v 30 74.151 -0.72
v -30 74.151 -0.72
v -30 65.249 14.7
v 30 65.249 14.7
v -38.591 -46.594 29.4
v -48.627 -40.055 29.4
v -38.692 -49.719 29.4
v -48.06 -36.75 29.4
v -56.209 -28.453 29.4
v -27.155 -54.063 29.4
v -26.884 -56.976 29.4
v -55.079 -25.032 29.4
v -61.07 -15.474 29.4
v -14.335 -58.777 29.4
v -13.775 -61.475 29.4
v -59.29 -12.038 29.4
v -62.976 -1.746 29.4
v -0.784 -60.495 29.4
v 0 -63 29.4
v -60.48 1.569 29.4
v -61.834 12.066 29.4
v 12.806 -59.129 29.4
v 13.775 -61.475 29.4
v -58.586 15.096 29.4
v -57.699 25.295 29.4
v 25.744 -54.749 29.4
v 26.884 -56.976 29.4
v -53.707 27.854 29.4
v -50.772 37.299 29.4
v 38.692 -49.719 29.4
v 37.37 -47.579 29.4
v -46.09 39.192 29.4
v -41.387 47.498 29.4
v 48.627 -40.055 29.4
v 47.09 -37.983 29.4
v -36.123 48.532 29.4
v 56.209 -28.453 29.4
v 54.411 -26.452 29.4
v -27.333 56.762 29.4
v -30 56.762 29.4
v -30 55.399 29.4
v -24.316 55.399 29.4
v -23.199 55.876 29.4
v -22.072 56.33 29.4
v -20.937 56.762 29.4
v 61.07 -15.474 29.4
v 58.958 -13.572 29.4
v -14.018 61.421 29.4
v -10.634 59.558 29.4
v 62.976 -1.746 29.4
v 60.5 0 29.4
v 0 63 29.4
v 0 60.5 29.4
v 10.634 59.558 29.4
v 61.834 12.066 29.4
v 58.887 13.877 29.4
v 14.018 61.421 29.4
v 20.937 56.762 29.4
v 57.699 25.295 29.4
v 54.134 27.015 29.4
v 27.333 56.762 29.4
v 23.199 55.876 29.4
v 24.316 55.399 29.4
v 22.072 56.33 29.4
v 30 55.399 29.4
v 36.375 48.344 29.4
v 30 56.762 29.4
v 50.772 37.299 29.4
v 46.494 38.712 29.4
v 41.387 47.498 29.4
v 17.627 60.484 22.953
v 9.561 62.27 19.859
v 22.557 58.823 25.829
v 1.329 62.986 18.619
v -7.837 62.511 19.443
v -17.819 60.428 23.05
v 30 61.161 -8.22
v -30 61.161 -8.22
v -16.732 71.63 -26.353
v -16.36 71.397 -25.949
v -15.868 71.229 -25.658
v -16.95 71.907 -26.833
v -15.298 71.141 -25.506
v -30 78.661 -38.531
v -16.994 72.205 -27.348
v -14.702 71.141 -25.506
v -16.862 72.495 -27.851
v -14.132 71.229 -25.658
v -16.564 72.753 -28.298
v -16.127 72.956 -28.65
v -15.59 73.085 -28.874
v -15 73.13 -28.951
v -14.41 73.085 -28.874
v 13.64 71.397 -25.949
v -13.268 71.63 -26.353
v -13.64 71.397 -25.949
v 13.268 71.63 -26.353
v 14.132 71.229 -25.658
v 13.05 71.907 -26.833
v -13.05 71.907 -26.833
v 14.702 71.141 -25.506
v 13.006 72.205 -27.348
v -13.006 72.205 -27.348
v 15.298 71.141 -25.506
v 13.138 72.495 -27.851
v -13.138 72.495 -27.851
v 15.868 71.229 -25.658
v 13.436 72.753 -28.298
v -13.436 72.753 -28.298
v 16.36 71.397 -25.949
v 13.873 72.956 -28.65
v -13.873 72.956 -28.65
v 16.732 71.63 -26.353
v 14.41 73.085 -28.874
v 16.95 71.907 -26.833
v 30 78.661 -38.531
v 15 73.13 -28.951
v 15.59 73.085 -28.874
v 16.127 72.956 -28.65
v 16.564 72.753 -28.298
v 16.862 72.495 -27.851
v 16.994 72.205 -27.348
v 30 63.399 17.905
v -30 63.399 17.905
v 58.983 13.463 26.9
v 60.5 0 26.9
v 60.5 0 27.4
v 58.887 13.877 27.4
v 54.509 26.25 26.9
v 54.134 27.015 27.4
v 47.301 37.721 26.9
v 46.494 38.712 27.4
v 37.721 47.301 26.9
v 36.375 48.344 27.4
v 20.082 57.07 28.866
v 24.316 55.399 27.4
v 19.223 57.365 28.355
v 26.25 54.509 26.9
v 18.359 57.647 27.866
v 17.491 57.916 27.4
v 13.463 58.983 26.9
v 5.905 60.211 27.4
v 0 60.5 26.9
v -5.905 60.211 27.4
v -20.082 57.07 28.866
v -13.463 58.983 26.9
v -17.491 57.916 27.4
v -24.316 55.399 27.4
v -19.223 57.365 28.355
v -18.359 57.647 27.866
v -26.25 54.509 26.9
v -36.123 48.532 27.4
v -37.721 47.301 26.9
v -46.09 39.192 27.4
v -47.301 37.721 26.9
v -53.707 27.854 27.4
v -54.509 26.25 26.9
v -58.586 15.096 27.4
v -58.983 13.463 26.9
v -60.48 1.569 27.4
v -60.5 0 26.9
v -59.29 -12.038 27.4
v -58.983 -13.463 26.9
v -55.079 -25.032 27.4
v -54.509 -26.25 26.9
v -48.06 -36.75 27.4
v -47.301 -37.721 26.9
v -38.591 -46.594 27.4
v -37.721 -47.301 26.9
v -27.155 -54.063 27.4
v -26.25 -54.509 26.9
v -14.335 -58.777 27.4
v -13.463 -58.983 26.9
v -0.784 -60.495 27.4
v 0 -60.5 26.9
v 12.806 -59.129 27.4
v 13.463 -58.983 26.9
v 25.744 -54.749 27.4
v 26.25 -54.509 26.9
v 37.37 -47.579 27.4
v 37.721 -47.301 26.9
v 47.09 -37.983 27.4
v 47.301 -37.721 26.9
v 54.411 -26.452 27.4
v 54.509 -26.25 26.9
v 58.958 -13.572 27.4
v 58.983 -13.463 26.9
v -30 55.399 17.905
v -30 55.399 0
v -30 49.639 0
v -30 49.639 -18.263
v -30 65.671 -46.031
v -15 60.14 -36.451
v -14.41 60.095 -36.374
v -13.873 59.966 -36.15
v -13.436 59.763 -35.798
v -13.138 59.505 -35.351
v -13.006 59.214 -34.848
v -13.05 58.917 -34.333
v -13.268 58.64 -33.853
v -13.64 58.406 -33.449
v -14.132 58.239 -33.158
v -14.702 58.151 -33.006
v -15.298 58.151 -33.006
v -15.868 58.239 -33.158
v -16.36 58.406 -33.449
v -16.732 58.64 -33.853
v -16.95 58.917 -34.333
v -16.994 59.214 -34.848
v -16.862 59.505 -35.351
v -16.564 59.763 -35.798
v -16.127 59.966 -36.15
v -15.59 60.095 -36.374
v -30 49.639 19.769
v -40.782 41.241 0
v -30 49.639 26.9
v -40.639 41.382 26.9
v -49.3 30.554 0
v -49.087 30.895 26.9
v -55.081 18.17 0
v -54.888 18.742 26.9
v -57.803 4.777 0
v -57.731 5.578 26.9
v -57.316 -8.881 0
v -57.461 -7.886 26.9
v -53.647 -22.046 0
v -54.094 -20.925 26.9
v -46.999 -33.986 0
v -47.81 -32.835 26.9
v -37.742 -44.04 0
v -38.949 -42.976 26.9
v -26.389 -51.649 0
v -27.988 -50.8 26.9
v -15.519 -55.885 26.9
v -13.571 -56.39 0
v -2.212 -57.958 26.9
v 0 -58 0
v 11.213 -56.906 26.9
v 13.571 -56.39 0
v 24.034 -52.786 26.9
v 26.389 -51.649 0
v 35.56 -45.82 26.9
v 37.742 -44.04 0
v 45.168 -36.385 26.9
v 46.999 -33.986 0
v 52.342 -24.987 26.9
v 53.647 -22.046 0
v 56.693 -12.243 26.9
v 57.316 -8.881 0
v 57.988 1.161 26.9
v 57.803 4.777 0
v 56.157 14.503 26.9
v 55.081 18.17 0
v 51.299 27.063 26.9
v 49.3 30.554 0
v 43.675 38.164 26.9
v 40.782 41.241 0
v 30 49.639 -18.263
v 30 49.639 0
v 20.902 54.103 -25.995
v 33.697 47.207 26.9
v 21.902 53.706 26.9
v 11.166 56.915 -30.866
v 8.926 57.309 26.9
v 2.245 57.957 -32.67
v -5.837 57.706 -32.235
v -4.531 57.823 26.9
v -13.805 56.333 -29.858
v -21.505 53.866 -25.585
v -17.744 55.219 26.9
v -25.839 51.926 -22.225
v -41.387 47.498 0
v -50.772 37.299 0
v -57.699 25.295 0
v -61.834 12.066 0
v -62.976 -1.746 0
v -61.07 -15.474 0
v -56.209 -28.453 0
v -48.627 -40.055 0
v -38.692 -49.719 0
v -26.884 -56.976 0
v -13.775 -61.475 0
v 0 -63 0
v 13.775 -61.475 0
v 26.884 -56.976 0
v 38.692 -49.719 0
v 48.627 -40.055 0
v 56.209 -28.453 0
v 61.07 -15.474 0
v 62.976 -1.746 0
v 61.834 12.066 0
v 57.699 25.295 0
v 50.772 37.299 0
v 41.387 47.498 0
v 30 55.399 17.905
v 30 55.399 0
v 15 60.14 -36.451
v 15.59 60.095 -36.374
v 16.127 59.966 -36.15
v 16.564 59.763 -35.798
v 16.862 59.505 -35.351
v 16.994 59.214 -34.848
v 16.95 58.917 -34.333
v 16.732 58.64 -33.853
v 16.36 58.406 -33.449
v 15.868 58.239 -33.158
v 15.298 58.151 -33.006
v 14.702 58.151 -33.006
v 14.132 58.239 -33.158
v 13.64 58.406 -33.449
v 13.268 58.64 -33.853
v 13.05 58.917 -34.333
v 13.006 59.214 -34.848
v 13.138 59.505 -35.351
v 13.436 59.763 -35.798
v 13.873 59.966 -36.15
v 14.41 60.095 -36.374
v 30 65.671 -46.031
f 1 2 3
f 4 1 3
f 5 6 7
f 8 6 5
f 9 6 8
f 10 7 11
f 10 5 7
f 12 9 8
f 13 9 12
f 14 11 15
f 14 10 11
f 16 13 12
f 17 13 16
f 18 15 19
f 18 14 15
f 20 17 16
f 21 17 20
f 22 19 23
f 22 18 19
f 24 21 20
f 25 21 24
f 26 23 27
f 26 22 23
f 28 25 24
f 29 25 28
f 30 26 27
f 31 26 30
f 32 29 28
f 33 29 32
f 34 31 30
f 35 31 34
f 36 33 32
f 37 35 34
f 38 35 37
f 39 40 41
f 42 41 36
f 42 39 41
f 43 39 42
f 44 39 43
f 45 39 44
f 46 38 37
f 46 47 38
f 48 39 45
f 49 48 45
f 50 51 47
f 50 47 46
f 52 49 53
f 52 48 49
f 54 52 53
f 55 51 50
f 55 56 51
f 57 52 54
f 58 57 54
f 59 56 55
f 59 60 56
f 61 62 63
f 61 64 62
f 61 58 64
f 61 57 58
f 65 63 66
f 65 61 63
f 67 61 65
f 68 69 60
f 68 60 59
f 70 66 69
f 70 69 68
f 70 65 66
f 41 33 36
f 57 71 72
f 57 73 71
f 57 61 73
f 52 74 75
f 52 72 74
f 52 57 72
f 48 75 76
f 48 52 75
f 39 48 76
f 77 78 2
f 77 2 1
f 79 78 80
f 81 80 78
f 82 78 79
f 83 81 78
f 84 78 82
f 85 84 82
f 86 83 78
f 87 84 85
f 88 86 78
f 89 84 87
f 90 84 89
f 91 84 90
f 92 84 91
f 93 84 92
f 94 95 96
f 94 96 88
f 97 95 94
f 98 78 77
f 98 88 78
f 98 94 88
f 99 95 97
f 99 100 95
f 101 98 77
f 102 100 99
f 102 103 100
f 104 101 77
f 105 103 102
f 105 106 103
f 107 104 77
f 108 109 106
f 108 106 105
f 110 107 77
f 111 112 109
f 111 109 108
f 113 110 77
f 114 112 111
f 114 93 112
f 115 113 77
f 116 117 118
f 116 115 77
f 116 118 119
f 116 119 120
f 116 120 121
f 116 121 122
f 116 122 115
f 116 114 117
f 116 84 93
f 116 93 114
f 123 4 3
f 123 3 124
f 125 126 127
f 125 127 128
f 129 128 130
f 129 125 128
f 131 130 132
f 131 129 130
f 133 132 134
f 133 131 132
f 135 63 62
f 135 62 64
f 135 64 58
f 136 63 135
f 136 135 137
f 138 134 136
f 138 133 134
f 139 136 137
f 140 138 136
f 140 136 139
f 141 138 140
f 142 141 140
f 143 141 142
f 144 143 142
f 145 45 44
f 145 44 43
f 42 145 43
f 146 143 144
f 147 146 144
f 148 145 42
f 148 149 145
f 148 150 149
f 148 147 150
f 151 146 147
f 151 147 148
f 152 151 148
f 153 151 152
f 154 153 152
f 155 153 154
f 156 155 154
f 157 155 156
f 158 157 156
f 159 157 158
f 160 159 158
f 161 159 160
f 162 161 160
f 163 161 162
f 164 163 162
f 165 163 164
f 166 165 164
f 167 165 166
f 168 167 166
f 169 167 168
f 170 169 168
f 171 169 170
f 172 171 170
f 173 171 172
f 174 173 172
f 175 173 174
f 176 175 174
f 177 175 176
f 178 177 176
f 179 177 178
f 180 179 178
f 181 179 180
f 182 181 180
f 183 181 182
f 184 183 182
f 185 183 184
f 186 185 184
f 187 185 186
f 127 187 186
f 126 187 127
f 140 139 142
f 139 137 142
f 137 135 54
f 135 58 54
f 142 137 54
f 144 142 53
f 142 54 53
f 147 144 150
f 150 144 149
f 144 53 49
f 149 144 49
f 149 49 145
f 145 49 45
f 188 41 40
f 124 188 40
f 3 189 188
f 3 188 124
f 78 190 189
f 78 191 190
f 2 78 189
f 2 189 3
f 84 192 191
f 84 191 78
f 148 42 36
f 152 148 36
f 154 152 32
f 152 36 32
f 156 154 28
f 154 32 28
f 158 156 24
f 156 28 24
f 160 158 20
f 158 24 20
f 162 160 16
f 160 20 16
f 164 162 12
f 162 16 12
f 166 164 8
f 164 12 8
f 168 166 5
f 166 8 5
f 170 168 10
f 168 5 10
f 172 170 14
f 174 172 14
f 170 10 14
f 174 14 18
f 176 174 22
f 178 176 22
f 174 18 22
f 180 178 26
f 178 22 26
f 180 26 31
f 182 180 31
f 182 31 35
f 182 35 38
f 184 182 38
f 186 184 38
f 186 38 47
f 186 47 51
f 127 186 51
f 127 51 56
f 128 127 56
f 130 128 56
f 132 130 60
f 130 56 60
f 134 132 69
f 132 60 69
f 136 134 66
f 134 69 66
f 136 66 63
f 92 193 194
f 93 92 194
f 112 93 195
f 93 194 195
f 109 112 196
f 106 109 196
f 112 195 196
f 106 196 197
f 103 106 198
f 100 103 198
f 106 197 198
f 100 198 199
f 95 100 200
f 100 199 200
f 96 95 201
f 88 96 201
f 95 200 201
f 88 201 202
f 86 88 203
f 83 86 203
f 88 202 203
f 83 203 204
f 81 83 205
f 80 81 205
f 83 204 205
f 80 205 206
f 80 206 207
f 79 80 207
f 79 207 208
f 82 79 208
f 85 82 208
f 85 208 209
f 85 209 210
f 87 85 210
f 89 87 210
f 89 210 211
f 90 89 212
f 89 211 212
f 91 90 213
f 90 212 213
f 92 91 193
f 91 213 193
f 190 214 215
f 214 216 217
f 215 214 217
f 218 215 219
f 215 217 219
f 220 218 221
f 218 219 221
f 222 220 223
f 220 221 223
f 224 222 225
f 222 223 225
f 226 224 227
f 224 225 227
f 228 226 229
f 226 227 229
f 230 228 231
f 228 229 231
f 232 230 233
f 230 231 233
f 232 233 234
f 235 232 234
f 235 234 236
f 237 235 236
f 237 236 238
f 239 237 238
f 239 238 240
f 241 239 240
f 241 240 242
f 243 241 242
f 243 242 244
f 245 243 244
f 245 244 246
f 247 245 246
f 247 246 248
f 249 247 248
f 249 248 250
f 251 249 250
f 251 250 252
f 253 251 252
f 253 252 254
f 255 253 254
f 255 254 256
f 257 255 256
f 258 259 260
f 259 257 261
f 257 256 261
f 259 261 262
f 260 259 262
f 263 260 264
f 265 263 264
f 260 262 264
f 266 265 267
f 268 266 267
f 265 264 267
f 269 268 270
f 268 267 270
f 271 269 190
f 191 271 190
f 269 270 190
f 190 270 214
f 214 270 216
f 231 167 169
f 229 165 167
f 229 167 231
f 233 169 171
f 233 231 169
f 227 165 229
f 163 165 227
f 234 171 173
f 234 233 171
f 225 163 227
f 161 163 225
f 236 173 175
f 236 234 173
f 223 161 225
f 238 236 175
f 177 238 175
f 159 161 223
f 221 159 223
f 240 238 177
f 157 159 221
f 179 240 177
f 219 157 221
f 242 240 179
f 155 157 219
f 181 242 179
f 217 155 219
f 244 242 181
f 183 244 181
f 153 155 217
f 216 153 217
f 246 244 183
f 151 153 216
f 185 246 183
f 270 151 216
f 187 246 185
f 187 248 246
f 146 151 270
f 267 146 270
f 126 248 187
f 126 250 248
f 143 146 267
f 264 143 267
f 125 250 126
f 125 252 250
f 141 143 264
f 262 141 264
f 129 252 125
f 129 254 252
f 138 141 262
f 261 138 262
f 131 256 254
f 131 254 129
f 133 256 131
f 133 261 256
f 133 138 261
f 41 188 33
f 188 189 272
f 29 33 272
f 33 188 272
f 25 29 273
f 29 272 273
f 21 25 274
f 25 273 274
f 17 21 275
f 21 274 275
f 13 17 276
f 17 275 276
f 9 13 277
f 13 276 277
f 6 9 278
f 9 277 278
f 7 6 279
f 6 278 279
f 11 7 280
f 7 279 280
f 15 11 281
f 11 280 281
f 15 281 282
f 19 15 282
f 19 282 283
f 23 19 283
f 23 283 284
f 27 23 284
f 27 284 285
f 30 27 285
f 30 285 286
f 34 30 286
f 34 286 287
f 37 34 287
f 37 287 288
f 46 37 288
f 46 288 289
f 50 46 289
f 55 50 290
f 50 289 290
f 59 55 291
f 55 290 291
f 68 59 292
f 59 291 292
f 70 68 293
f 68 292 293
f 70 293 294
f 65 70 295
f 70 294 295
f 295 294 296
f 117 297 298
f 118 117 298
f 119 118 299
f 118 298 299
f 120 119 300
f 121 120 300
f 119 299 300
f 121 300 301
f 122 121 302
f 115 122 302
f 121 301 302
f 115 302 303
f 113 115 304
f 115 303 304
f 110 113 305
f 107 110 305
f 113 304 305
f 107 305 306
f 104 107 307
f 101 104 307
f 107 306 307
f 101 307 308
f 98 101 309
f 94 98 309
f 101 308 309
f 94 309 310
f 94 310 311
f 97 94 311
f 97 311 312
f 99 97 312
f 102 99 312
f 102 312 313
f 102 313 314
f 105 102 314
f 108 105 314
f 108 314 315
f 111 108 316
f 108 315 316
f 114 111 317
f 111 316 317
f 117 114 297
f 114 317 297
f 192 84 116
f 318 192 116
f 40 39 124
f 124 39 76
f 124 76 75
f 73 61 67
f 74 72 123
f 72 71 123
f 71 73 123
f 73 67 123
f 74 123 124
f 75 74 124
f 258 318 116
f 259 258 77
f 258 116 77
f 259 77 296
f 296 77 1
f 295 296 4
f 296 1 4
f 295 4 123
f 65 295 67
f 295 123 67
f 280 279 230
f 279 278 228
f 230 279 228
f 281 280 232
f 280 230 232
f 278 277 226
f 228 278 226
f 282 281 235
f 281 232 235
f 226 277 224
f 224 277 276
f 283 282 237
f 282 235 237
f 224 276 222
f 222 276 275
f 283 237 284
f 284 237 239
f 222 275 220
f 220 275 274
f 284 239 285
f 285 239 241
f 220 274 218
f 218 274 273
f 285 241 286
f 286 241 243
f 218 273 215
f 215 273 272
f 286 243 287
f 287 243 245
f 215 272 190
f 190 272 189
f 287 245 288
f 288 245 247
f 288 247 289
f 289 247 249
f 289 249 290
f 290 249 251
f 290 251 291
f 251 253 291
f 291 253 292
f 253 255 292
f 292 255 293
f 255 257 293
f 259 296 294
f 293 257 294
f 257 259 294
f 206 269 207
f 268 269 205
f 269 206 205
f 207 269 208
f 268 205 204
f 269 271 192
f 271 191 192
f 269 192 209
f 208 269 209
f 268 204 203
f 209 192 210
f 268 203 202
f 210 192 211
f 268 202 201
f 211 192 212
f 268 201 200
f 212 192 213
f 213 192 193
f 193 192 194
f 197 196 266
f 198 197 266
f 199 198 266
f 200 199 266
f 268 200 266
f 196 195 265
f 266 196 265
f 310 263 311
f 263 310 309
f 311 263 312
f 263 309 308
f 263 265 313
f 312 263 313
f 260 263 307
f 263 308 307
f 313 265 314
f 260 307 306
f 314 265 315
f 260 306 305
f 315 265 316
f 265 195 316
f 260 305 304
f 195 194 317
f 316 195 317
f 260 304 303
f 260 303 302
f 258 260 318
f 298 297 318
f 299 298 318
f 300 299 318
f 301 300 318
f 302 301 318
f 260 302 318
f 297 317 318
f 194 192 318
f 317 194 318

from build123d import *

# Parameters (mm, degrees)
SKETCH1_R                  = 63
SKETCH1_R_2                = 58
BOSS_EXTRUDE1_DEPTH        = 29.4
SKETCH2_R                  = 60.5
SKETCH2_R_2                = 58
CUT_EXTRUDE1_DEPTH         = 2
BOSS_EXTRUDE2_REACH        = 115.821
BOSS_EXTRUDE2_START_RADIUS = 63
BOSS_EXTRUDE2_END_RADIUS   = 63
SKETCH3_W                  = 60
SKETCH3_H                  = 29.4
SKETCH5_W                  = 29.4
SKETCH5_H                  = 24.463774017
CUT_EXTRUDE2_DEPTH         = 60
BOSS_EXTRUDE3_DEPTH        = 60
SKETCH7_W                  = 60
SKETCH7_H                  = 58.8
BOSS_EXTRUDE4_DEPTH        = 50
CUT_EXTRUDE3_REACH         = 184.817
SKETCH9_W                  = 60
SKETCH9_H                  = 50
BOSS_EXTRUDE5_DEPTH        = 31.44
SKETCH10_W                 = 60
SKETCH10_H                 = 31.44
BOSS_EXTRUDE6_DEPTH        = 30
SKETCH11_R                 = 58
CUT_EXTRUDE4_DEPTH         = 167.216683318
SKETCH14_W                 = 60
SKETCH14_H                 = 50.574659949
CUT_EXTRUDE5_DEPTH         = 14.7
CUT_EXTRUDE6_REACH         = 169.252
BOSS_EXTRUDE7_REACH        = 150.201
BOSS_EXTRUDE10_DEPTH       = 60
SKETCH17_R                 = 58
CUT_EXTRUDE7_DEPTH         = 148.031754667
CUT_EXTRUDE7_DEPTH_BACK    = 148.031754667
CUT_EXTRUDE13_START        = -2.5
SKETCH26_R                 = 60.5
SKETCH26_R_2               = 57.5
CUT_EXTRUDE13_DEPTH        = 10
SKETCH27_R                 = 63
SKETCH27_R_2               = 60.5
CUT_EXTRUDE14_DEPTH        = 10
SKETCH28_R                 = 82.177963531
CUT_EXTRUDE15_DEPTH        = 10
SKETCH18_W                 = 60
SKETCH18_H                 = 15
CUT_EXTRUDE8_DEPTH         = 50
SKETCH29_R                 = 2
CUT_EXTRUDE16_DEPTH        = 15
CUT_EXTRUDE17_REACH        = 150.403
SKETCH30_W                 = 60
SKETCH30_H                 = 15


with BuildPart() as part:
    # Sketch1 → Boss-Extrude1 (new body)
    with BuildSketch(Plane.XY):
        Circle(SKETCH1_R)
        Circle(SKETCH1_R_2, mode=Mode.SUBTRACT)
    extrude(amount=BOSS_EXTRUDE1_DEPTH)

    # Sketch2 → Cut-Extrude1 (cut)
    with BuildSketch(Plane.XY.offset(29.4)):
        Circle(SKETCH2_R)
        Circle(SKETCH2_R_2, mode=Mode.SUBTRACT)
    extrude(amount=-CUT_EXTRUDE1_DEPTH, mode=Mode.SUBTRACT)

    # Boss-Extrude2: from a cylinder face, 115.821 long prism both ways, kept between that surface and its translate by the depth
    boss_extrude2_start = Plane(origin=(0, 0, 14.7), z_dir=(0, 0, -1)) * Cylinder(BOSS_EXTRUDE2_START_RADIUS, 358.642, mode=Mode.PRIVATE)
    boss_extrude2_end = Plane(origin=(0, 20, 14.7), z_dir=(0, 0, -1)) * Cylinder(BOSS_EXTRUDE2_END_RADIUS, 358.642, mode=Mode.PRIVATE)
    # Sketch3 → Boss-Extrude2 (add, from a surface)
    with BuildSketch(Plane(origin=(0, 0, 0), x_dir=(1, 0, 0), z_dir=(0, 1, 0)), mode=Mode.PRIVATE) as boss_extrude2_sk1:
        with Locations((0, -14.7)):
            Rectangle(SKETCH3_W, SKETCH3_H)
    boss_extrude2_tool1 = extrude(boss_extrude2_sk1.sketch, amount=BOSS_EXTRUDE2_REACH, both=True, mode=Mode.PRIVATE)
    add(((boss_extrude2_tool1 - boss_extrude2_start) & boss_extrude2_end).solids().sort_by_distance((0, 65.398556, 14.7))[0])

    # Sketch5 → Cut-Extrude2 (cut)
    with BuildSketch(Plane.ZY.offset(30)):
        with Locations((14.7, 87.630442947)):
            Rectangle(SKETCH5_W, SKETCH5_H)
    extrude(amount=-CUT_EXTRUDE2_DEPTH, mode=Mode.SUBTRACT)

    # Sketch6 → Boss-Extrude3 (add)
    with BuildSketch(Plane.ZY.offset(30)):
        Polygon((0, 75.398555938), (29.4, 126.32084968), (29.4, 75.398555938), align=None)
    extrude(amount=-BOSS_EXTRUDE3_DEPTH)

    # Sketch7 → Boss-Extrude4 (add)
    with BuildSketch(Plane(origin=(0, 18.849638984, -32.648532425), x_dir=(1, 0, 0), z_dir=(0, 0.500000000000004, -0.8660254037844364))):
        with Locations((0, -94.697064851)):
            Rectangle(SKETCH7_W, SKETCH7_H)
    extrude(amount=BOSS_EXTRUDE4_DEPTH)

    # Sketch8 → Cut-Extrude3 (cut, up to next)
    with BuildSketch(Plane(origin=(30, 0, 0), x_dir=(0, 0, -1), z_dir=(1, 0, 0)), mode=Mode.PRIVATE) as cut_extrude3_sk1:
        Polygon((28.601270189, 125.859702809), (-29.4, 92.372653852), (-29.4, 126.32084968), (13.901270189, 151.32084968), align=None)
    cut_extrude3_tool1 = extrude(cut_extrude3_sk1.sketch, amount=-CUT_EXTRUDE3_REACH, mode=Mode.PRIVATE) & part.part
    add(cut_extrude3_tool1.solids().sort_by_distance((30, 123.250107, 3.896605))[0], mode=Mode.SUBTRACT)

    # Sketch9 → Boss-Extrude5 (add)
    with BuildSketch(Plane(origin=(0, 56.548916953, 32.648532425), x_dir=(1, 0, 0), z_dir=(0, -0.8660254037844365, -0.500000000000004))):
        with Locations((0, -62.699277969)):
            Rectangle(SKETCH9_W, SKETCH9_H)
    extrude(amount=BOSS_EXTRUDE5_DEPTH)

    # Sketch10 → Boss-Extrude6 (add)
    with BuildSketch(Plane(origin=(0, 18.849638984, -32.648532425), x_dir=(1, 0, 0), z_dir=(0, -0.500000000000004, 0.8660254037844364))):
        with Locations((0, 49.577064851)):
            Rectangle(SKETCH10_W, SKETCH10_H)
    extrude(amount=BOSS_EXTRUDE6_DEPTH)

    # Sketch11 → Cut-Extrude4 (cut, through all)
    with BuildSketch(Plane.XY.offset(29.4)):
        with Locations(Location((0, 0, 0), (0, 0, 121.147389922))):
            Circle(SKETCH11_R)
    extrude(amount=-CUT_EXTRUDE4_DEPTH, mode=Mode.SUBTRACT)

    # Sketch14 → Cut-Extrude5 (cut)
    with BuildSketch(Plane.XY.offset(29.4)):
        with Locations((0, 117.659983826)):
            Rectangle(SKETCH14_W, SKETCH14_H)
        with BuildLine():
            ThreePointArc((30, 55.398555938), (0, 63), (-30, 55.398555938))
            Line((-30, 55.398555938), (-30, 92.372653852))
            Line((-30, 92.372653852), (30, 92.372653852))
            Line((30, 92.372653852), (30, 55.398555938))
        make_face()
    extrude(amount=-CUT_EXTRUDE5_DEPTH, mode=Mode.SUBTRACT)

    # Sketch15 → Cut-Extrude6 (cut, up to next)
    with BuildSketch(Plane(origin=(30, 0, 0), x_dir=(0, 0, -1), z_dir=(1, 0, 0)), mode=Mode.PRIVATE) as cut_extrude6_sk1:
        Polygon((44.021270189, 99.151479356), (-14.7, 65.248738206), (-14.7, 100.859702809), (28.601270189, 125.859702809), align=None)
    cut_extrude6_tool1 = extrude(cut_extrude6_sk1.sketch, amount=-CUT_EXTRUDE6_REACH, mode=Mode.PRIVATE) & part.part
    add(cut_extrude6_tool1.solids().sort_by_distance((30, 96.99498, -10.999854))[0], mode=Mode.SUBTRACT)

    # Boss-Extrude7: up to this face of the body (flat: up to its plane)
    boss_extrude7_end = Plane(part.part.faces().sort_by_distance((-30, 70.930733499, -23.393070455))[0])
    # Sketch16 → Boss-Extrude7 (add, up to the picked face)
    with BuildSketch(Plane(origin=(30, 0, 0), x_dir=(0, 0, -1), z_dir=(1, 0, 0)), mode=Mode.PRIVATE) as boss_extrude7_sk1:
        Polygon((-17.904609691, 55.398555938), (-14.7, 55.398555938), (-14.7, 65.248738206), (-17.904609691, 63.398555938), align=None)
    boss_extrude7_tool1 = split(extrude(boss_extrude7_sk1.sketch, amount=-BOSS_EXTRUDE7_REACH, mode=Mode.PRIVATE), bisect_by=boss_extrude7_end, keep=Keep.BOTH, mode=Mode.PRIVATE)
    add(boss_extrude7_tool1.solids().sort_by(Axis((30, 59.877083, 16.246945), (-1, 0, 0)))[0])

    # Sketch25 → Boss-Extrude10 (add)
    with BuildSketch(Plane(origin=(30, 0, 0), x_dir=(0, 0, -1), z_dir=(1, 0, 0))):
        Polygon((-17.904609691, 55.398555938), (-31.761016151, 55.398555938), (-17.904609691, 63.398555938), align=None)
    extrude(amount=-BOSS_EXTRUDE10_DEPTH)

    # Sketch17 → Cut-Extrude7 (cut, two sides)
    with BuildSketch(Plane.XY.offset(29.4)) as cut_extrude7_sk:
        with Locations(Location((0, 0, 0), (0, 0, 121.147389922))):
            Circle(SKETCH17_R)
    extrude(amount=CUT_EXTRUDE7_DEPTH, mode=Mode.SUBTRACT)
    extrude(cut_extrude7_sk.sketch, amount=-CUT_EXTRUDE7_DEPTH_BACK, mode=Mode.SUBTRACT)

    # Sketch26 → Cut-Extrude13 (cut)
    with BuildSketch(Plane.XY.offset(29.4).offset(CUT_EXTRUDE13_START)):
        Circle(SKETCH26_R)
        Circle(SKETCH26_R_2, mode=Mode.SUBTRACT)
    extrude(amount=CUT_EXTRUDE13_DEPTH, mode=Mode.SUBTRACT)

    # Sketch27 → Cut-Extrude14 (cut)
    with BuildSketch(Plane.XY.offset(29.4)):
        Circle(SKETCH27_R)
        Circle(SKETCH27_R_2, mode=Mode.SUBTRACT)
    extrude(amount=CUT_EXTRUDE14_DEPTH, mode=Mode.SUBTRACT)

    # Sketch28 → Cut-Extrude15 (cut)
    with BuildSketch(Plane.XY.offset(29.4)):
        Circle(SKETCH28_R)
    extrude(amount=CUT_EXTRUDE15_DEPTH, mode=Mode.SUBTRACT)

    # Sketch18 → Cut-Extrude8 (cut)
    with BuildSketch(Plane(origin=(0, 43.849638984, -75.949802615), x_dir=(1, 0, 0), z_dir=(0, 0.500000000000004, -0.8660254037844364))):
        with Locations((0, -56.357064851)):
            Rectangle(SKETCH18_W, SKETCH18_H)
    extrude(amount=-CUT_EXTRUDE8_DEPTH, mode=Mode.SUBTRACT)

    # Sketch29 → Cut-Extrude16 (cut)
    with BuildSketch(Plane(origin=(0, 29.321078258, 16.928532425), x_dir=(1, 0, 0), z_dir=(0, -0.8660254037844362, -0.5000000000000041))):
        with Locations(Location((-15, -59.636899675, 0), (0, 0, 270))):
            Circle(SKETCH29_R)
        with Locations(Location((15, -59.636899675, 0), (0, 0, 270))):
            Circle(SKETCH29_R)
    extrude(amount=-CUT_EXTRUDE16_DEPTH, mode=Mode.SUBTRACT)

    # Sketch30 → Cut-Extrude17 (cut, up to next)
    with BuildSketch(Plane(origin=(0, 42.311459315, 24.428532425), x_dir=(1, 0, 0), z_dir=(0, 0.8660254037844364, 0.5000000000000041)), mode=Mode.PRIVATE) as cut_extrude17_sk1:
        with Locations((0, 80.199277969)):
            Rectangle(SKETCH30_W, SKETCH30_H)
    cut_extrude17_tool1 = extrude(cut_extrude17_sk1.sketch, amount=-CUT_EXTRUDE17_REACH, mode=Mode.PRIVATE) & part.part
    add(cut_extrude17_tool1.solids().sort_by_distance((0, 82.411098, -45.02608))[0], mode=Mode.SUBTRACT)


solid = part.part
